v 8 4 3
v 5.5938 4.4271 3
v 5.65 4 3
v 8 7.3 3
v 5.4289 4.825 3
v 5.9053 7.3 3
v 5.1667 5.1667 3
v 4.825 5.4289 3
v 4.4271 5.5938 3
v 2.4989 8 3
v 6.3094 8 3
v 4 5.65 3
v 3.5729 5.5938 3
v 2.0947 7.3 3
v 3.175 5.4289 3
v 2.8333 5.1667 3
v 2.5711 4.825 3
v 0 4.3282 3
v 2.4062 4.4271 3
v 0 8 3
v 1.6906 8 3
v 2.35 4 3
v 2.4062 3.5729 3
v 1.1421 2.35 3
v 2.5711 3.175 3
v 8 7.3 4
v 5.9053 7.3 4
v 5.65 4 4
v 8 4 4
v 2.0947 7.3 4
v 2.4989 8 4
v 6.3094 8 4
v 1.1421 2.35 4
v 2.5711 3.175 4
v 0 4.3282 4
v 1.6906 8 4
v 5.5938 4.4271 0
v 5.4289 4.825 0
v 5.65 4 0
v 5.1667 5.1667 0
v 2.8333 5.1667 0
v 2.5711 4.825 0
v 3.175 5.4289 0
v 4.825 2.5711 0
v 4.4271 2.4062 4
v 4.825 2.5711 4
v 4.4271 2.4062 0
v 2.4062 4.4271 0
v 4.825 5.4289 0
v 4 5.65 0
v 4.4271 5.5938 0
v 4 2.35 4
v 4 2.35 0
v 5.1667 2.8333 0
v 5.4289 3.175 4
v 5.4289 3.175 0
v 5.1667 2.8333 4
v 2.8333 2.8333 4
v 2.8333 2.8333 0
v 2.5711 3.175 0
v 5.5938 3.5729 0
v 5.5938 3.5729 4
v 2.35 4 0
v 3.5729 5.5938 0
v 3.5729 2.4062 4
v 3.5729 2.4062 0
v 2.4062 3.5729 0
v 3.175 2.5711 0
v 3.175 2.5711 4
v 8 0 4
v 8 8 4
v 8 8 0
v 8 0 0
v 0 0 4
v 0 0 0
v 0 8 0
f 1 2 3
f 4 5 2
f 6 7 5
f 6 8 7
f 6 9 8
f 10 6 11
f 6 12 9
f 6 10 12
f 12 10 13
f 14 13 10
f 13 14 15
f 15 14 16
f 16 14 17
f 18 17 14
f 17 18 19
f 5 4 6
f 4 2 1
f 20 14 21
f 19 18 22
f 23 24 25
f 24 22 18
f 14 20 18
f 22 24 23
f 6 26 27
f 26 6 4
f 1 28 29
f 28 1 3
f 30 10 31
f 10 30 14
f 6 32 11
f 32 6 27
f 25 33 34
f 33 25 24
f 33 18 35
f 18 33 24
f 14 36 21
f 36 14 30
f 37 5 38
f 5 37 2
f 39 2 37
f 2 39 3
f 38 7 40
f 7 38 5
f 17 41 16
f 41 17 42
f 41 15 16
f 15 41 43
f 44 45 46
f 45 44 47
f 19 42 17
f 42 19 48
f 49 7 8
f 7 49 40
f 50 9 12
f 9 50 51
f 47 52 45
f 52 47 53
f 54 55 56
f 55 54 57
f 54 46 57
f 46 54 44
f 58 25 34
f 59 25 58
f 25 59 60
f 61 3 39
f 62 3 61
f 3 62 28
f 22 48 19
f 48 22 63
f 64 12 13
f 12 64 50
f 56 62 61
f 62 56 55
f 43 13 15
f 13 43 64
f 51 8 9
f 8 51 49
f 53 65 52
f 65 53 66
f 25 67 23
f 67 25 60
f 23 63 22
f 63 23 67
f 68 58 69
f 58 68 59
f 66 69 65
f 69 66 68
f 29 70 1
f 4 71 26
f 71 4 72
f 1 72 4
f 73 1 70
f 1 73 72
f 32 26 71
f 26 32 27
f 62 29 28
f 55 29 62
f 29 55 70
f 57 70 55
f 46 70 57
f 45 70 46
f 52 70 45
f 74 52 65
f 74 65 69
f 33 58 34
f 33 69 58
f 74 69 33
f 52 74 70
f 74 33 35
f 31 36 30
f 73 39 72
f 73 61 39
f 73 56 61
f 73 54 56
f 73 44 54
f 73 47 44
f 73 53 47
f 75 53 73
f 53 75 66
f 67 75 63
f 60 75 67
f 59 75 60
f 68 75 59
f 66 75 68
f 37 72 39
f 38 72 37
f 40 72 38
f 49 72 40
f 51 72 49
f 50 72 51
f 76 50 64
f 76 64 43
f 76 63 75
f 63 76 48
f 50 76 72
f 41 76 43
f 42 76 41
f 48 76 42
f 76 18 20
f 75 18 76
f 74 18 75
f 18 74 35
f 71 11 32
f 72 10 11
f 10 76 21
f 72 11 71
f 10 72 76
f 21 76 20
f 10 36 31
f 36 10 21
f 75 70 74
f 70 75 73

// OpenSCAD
width = 5.7;
edge = 3.3;
difference() {
    cube([8,8,4]);
    translate([4,4,3]) {
        cube([width,edge,2],1);
        rotate([0,0,60]) { cube([width,edge,2],1);}
        rotate([0,0,120]) { cube([width,edge,2],1); }
        cylinder(20,3.3/2,3.3/2,center=true,$fn=24);
    }
}
